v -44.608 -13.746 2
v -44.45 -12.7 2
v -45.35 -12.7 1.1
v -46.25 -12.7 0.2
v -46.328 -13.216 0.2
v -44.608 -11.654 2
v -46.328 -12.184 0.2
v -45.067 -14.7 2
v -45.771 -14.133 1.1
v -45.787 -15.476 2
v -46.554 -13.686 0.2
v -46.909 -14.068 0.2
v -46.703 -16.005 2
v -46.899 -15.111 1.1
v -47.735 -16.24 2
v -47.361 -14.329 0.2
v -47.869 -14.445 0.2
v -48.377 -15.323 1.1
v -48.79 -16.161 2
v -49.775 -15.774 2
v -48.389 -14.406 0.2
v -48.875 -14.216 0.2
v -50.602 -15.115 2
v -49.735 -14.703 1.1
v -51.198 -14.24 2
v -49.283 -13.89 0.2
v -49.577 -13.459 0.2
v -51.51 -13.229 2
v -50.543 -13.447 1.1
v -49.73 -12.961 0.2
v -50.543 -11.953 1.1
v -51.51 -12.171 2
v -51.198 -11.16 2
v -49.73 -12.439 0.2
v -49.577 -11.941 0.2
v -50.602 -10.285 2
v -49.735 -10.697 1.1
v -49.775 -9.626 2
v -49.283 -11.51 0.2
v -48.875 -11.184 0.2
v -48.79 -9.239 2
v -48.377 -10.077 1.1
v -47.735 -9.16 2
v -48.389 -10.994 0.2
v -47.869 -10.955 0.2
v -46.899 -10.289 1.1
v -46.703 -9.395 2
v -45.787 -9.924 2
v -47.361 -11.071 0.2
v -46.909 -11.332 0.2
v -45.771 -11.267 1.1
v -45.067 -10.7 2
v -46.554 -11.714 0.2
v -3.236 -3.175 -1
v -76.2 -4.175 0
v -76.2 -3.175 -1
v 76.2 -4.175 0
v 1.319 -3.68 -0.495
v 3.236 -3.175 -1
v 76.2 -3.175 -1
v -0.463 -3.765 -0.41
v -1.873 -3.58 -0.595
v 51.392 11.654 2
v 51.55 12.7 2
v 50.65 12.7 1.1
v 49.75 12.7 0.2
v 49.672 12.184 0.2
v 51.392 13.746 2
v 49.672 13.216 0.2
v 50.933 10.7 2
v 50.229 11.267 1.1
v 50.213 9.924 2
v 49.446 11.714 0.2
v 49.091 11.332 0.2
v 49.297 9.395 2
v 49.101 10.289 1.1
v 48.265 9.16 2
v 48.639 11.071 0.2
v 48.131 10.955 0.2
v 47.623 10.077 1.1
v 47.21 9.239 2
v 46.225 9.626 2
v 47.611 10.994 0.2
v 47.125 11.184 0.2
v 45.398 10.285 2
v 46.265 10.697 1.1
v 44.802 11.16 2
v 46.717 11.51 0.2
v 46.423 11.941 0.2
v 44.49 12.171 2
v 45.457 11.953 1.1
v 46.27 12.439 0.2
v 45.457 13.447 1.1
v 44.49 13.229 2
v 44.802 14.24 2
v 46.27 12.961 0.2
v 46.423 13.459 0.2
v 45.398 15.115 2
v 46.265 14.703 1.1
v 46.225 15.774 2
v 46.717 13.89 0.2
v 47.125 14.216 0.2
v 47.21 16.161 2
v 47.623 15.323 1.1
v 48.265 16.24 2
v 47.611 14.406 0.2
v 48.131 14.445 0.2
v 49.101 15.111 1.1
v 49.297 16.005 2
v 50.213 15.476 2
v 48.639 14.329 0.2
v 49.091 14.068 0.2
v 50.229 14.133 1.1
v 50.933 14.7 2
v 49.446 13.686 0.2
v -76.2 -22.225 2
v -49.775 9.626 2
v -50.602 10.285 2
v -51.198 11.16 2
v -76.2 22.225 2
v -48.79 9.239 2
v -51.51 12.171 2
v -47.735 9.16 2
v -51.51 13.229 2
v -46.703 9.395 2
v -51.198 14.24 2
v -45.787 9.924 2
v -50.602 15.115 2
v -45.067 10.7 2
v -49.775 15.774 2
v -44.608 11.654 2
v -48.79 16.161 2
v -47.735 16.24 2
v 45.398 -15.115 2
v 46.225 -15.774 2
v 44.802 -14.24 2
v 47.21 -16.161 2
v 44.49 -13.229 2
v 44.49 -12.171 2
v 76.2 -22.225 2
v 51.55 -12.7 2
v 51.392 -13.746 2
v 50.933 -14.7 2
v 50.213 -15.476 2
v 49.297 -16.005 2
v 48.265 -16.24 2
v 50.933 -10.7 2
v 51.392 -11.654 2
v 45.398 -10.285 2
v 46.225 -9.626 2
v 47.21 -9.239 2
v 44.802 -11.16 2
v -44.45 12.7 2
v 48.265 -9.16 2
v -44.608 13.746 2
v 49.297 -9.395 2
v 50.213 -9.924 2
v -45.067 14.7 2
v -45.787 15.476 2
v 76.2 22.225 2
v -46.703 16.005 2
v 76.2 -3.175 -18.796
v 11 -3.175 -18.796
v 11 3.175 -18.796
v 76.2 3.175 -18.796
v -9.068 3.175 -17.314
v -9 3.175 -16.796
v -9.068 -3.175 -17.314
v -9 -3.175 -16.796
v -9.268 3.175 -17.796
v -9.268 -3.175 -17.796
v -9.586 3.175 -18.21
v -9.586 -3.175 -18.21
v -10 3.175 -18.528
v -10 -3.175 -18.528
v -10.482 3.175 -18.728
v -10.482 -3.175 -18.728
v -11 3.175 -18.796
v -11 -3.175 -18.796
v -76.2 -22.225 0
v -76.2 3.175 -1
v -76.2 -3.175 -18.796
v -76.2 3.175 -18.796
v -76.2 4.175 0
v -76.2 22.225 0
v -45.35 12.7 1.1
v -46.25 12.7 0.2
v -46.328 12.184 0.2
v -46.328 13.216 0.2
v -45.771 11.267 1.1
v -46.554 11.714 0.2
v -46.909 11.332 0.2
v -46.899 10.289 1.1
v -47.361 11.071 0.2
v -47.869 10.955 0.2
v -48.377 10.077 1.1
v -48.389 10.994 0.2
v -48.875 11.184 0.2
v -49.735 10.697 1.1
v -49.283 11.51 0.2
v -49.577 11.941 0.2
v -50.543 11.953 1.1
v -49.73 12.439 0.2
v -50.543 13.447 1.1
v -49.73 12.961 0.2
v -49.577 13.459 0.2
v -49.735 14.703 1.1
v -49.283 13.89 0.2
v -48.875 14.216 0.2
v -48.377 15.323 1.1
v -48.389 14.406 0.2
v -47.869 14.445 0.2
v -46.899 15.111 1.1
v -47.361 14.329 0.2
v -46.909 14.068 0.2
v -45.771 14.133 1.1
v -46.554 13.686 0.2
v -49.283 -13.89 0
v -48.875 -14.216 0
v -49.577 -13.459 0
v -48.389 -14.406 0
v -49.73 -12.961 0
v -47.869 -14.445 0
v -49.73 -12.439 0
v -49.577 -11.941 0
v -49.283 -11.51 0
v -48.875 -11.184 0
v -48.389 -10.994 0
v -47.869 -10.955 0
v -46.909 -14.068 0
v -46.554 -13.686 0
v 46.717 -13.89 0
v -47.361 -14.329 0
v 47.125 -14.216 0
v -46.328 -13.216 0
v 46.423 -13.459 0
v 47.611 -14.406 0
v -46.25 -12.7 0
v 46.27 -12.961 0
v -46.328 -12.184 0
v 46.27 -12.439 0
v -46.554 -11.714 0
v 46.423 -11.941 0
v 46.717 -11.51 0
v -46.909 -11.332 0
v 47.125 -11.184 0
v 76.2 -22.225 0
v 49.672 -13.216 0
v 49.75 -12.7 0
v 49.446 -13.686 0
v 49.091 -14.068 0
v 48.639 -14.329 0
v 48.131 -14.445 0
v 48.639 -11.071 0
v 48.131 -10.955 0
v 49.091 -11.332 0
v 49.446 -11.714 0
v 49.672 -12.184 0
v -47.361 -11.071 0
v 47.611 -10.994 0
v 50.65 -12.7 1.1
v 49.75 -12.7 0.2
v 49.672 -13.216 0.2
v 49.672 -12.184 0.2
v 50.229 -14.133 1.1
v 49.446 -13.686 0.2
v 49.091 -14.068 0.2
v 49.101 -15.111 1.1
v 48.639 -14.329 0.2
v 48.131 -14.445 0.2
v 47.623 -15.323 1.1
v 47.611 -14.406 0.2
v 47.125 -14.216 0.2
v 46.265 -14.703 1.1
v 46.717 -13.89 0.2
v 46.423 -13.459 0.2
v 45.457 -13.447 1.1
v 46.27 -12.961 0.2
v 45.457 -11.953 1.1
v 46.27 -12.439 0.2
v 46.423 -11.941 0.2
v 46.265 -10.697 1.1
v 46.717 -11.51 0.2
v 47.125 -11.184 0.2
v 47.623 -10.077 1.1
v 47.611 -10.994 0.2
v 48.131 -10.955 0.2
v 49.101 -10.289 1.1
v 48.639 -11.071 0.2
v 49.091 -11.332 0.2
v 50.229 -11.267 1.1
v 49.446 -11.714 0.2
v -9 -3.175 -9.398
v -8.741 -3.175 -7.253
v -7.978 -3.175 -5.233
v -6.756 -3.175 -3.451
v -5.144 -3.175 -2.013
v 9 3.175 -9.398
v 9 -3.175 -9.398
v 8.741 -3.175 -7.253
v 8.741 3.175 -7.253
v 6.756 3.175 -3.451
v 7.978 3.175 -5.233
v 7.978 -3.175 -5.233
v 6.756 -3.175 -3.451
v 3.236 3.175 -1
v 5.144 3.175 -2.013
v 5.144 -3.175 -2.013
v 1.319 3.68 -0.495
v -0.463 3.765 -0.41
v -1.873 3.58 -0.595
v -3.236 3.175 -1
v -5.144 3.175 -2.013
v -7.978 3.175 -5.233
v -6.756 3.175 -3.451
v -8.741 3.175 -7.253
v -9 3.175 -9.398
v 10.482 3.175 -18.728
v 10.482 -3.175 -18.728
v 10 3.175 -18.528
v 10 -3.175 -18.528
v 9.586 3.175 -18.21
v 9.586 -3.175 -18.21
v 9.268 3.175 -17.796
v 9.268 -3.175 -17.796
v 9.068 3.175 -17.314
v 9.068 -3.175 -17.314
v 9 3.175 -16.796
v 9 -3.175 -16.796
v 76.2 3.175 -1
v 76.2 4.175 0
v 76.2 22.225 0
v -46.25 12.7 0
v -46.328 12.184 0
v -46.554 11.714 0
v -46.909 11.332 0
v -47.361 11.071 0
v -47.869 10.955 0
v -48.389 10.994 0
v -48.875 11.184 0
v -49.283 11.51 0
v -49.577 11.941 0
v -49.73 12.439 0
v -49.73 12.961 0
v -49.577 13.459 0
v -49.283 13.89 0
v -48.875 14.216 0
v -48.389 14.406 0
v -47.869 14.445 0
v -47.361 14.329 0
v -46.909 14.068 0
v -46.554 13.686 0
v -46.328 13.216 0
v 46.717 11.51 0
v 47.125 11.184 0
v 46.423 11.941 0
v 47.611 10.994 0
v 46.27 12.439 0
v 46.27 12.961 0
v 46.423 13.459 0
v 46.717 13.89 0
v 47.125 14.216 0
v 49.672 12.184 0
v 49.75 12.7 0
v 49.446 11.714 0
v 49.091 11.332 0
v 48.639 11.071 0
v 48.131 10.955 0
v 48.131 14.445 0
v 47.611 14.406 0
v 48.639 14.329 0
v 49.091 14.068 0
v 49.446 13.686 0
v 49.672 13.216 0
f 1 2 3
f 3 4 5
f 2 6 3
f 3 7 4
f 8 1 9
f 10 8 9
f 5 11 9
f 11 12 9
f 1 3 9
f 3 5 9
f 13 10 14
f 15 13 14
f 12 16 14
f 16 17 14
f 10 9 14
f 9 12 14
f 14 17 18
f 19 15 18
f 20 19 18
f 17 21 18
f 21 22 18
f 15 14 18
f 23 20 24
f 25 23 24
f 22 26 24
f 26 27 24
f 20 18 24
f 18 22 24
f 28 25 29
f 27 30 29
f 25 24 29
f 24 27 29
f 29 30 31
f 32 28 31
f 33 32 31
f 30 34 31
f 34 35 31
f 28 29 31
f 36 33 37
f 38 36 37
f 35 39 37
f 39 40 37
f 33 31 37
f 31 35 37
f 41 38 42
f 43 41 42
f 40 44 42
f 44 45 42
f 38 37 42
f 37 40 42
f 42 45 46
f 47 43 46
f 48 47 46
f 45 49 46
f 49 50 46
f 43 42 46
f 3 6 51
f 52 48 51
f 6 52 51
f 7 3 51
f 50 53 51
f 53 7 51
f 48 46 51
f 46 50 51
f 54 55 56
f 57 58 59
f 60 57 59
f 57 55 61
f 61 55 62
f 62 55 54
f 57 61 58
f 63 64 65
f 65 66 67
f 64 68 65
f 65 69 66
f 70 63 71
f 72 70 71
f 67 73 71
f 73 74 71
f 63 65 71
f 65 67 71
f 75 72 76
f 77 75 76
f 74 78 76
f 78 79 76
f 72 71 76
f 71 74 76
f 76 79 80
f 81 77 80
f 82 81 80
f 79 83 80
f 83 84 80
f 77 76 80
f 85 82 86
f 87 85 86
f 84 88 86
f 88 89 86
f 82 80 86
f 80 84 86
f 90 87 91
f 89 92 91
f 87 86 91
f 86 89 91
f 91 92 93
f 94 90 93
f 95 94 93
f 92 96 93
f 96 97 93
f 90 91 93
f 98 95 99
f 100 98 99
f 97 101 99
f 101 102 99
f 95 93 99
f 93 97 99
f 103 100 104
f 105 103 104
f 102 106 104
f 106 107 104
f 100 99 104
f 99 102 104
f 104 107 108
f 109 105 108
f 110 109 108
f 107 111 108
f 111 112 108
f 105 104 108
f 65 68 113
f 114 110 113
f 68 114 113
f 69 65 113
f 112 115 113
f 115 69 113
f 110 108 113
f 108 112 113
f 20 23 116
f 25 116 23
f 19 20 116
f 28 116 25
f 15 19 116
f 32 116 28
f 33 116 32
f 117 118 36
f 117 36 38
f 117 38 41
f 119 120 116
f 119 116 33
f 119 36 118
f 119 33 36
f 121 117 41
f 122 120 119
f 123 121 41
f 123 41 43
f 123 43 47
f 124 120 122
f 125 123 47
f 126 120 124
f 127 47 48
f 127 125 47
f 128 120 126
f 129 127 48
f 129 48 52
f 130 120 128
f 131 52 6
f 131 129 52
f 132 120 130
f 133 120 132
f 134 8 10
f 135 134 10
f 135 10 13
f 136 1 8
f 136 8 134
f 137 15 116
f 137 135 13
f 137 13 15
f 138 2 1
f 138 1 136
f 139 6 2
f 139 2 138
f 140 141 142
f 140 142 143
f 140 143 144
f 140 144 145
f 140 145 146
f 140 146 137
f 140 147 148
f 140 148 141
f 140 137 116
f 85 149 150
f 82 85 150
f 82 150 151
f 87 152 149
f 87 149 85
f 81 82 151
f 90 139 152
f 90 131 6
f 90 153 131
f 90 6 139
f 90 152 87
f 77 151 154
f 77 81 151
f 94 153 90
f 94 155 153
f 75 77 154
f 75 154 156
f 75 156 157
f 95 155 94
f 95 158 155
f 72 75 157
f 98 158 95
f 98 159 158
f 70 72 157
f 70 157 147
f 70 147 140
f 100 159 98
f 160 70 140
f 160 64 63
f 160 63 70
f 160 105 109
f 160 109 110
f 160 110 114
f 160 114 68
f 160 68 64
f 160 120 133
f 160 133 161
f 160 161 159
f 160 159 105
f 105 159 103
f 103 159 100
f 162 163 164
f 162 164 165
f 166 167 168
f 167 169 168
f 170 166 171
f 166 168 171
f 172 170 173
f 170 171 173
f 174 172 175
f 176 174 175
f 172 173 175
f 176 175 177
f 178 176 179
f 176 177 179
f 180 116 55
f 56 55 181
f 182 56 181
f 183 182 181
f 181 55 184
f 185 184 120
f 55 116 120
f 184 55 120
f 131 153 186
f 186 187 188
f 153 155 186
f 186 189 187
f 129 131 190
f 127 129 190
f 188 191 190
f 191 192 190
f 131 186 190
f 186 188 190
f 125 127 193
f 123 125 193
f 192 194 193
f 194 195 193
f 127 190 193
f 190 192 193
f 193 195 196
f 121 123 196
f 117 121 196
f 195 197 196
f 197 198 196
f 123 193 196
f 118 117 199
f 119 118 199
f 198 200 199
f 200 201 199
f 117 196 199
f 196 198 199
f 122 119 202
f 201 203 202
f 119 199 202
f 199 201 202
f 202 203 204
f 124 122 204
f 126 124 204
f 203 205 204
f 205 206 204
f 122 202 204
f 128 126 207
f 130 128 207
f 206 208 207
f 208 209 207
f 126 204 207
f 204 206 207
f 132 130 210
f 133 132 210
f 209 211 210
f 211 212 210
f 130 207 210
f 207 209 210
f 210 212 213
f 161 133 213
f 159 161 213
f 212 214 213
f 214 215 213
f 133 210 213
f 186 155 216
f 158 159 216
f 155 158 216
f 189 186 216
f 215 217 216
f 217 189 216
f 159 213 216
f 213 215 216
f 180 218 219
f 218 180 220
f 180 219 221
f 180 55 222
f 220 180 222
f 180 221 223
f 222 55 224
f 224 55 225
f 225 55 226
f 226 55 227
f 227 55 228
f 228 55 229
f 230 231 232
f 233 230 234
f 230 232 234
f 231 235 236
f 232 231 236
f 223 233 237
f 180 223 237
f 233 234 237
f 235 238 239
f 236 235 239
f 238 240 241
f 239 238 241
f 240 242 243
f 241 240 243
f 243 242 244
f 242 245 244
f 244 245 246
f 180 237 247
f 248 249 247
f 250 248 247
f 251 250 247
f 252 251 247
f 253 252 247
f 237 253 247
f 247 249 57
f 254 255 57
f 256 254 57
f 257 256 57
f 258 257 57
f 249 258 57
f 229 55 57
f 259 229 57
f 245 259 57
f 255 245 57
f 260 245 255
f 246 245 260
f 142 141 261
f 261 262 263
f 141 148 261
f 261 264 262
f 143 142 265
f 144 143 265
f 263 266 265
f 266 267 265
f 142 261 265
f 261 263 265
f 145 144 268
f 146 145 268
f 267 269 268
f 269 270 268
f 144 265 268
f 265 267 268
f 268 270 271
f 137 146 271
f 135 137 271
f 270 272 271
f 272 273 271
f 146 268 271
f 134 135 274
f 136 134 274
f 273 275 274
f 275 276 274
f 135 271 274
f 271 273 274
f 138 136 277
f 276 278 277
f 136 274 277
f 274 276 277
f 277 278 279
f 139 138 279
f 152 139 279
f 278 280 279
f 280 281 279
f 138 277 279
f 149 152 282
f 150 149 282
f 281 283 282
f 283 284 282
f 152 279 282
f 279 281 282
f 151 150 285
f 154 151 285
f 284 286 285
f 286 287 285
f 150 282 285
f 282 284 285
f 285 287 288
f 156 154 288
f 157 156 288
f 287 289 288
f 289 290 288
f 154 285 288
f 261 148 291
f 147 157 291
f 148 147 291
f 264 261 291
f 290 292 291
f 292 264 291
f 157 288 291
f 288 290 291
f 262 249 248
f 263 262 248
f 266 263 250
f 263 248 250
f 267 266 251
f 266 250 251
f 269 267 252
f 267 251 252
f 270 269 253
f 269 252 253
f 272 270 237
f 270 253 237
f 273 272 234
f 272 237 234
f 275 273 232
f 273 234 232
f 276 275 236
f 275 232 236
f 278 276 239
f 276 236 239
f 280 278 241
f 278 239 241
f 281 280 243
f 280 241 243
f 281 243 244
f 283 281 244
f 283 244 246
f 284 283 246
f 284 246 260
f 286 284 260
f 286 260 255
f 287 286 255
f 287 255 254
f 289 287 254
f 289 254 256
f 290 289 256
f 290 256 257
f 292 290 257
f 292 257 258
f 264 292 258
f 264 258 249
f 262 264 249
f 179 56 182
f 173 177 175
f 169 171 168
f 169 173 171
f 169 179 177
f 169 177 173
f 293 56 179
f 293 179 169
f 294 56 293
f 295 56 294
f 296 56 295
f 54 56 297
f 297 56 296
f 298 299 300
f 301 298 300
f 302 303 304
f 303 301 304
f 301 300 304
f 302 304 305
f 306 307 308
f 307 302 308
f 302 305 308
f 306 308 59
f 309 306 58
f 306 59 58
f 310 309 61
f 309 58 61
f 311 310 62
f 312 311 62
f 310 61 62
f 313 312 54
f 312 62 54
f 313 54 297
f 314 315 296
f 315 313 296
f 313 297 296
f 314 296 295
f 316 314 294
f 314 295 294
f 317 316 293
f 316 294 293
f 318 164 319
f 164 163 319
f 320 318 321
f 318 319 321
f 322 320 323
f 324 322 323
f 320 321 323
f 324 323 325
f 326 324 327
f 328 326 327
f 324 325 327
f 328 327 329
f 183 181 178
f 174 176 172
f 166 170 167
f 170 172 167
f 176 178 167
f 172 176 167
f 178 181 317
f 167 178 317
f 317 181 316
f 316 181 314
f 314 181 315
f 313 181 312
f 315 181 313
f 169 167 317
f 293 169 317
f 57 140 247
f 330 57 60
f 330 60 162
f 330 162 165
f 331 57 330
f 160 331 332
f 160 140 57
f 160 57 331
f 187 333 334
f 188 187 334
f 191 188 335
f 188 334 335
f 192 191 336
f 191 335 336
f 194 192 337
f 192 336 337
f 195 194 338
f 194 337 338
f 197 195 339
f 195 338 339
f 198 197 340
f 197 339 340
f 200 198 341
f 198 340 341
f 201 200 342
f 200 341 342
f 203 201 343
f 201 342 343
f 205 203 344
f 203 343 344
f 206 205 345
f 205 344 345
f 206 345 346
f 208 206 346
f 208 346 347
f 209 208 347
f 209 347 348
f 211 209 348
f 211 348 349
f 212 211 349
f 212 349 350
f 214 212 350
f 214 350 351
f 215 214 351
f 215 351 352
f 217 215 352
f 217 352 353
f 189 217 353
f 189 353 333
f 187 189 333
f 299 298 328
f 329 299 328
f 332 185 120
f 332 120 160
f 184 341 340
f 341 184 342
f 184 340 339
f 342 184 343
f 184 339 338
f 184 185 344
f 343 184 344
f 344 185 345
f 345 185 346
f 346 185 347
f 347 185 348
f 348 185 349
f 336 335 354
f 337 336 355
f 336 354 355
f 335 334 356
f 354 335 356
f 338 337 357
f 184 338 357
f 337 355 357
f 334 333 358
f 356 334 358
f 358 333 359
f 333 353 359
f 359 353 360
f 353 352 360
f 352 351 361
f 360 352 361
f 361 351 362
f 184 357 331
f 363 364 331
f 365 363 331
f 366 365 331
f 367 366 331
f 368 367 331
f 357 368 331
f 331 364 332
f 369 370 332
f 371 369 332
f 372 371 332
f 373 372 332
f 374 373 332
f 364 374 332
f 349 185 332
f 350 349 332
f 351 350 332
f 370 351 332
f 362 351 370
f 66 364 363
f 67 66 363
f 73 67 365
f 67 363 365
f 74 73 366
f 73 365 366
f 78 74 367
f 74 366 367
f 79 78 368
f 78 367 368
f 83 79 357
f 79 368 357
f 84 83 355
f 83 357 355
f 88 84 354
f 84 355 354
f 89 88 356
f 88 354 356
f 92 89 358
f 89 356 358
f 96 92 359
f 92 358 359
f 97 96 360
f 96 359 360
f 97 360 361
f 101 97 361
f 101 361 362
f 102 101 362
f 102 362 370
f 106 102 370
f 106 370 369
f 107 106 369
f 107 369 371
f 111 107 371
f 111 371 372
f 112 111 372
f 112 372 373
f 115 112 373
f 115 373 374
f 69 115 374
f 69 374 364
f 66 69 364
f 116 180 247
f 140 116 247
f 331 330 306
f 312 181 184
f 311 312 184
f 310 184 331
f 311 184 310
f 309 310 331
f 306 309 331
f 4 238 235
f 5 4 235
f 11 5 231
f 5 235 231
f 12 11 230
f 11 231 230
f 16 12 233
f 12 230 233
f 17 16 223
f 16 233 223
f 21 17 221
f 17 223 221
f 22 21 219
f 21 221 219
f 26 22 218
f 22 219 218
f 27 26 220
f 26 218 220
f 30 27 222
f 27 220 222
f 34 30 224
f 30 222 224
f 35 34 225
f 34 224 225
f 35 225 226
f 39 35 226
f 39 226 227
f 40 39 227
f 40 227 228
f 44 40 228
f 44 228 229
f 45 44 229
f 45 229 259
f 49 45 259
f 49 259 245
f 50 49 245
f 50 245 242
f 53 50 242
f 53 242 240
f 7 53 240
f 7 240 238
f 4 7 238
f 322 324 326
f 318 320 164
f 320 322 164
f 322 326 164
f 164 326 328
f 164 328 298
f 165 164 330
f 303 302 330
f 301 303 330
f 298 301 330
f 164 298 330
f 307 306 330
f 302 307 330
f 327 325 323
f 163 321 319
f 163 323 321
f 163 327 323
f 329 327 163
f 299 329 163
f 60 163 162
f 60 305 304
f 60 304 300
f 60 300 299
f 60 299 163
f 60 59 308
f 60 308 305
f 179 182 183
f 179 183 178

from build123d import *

# Parameters (mm, degrees)
F0_W         = 152.4
F0_H         = 44.45
F1_DEPTH     = 2
F2_W         = 152.4
F2_H         = 6.35
F3_DEPTH     = 18.796
F4_R         = 1.75
F5_DEPTH     = 25
F7_DEPTH     = 25.401
F8_SIZE      = 1.8
F9_T4_DEPTH  = 152.4
F9_S5_R      = 9
F9_T6_DEPTH  = 78
F9_T10_DEPTH = 152.4
F9_S11_R     = 9
F9_T12_DEPTH = 78
F10_R        = 2


# Not quite as in the source:
# - a fillet or chamfer that OpenCascade refuses, or shapes differently, is made with other operations: its cross-section is extruded or revolved along the edge and cut away or added
# - a feature names something its author has since deleted; it is built from what else it names


with BuildPart() as f1:
    # F0 (on Top) → F1 (new body)
    with BuildSketch(Plane.XY):
        Rectangle(F0_W, F0_H)
    extrude(amount=F1_DEPTH)

    # F2 (on face) → F3 (join)
    with BuildSketch(Plane(origin=(0, 0, 0), x_dir=(1, 0, 0), z_dir=(0, 0, -1))):
        Rectangle(F2_W, F2_H)
    extrude(amount=F3_DEPTH)

    # F4 (on face) → F5 (cut)
    with BuildSketch(Plane(origin=(0, 0, 0), x_dir=(1, 0, 0), z_dir=(0, 0, -1))):
        with Locations((48, -12.7)):
            Circle(F4_R)
        with Locations((-48, -12.7)):
            Circle(F4_R)
        with Locations((-48, 12.7)):
            Circle(F4_R)
        with Locations((48, 12.7)):
            Circle(F4_R)
    extrude(amount=-F5_DEPTH, mode=Mode.SUBTRACT)

    # F6 (on face) → F7 (cut, through all)
    with BuildSketch(Plane(origin=(0, 3.175, 0), x_dir=(-1, 0, 0), z_dir=(0, 1, 0))):
        with BuildLine():
            ThreePointArc((-9, -9.398), (0, -18.398), (9, -9.398))
            ThreePointArc((9, -9.398), (0, -0.398), (-9, -9.398))
        make_face()
        with BuildLine():
            Line((9, -18.796), (9, -9.398))
            ThreePointArc((9, -9.398), (0, -18.398), (-9, -9.398))
            Line((-9, -9.398), (-9, -18.796))
            Line((-9, -18.796), (9, -18.796))
        make_face()
    extrude(amount=-F7_DEPTH, mode=Mode.SUBTRACT)

    # F8
    f8_edges = [f1.edges().sort_by_distance(p)[0] for p in [
        (46.25, -12.7, 2),
        (-49.75, -12.7, 2),
        (-49.75, 12.7, 2),
        (46.25, 12.7, 2),
    ]]
    chamfer(f8_edges, length=F8_SIZE)

    # F9: chamfer of 1 on 2 edges, made by hand


with BuildPart() as f9_tool2:
    # F9_s3 → F9_t4 (new body)
    with BuildSketch(Plane.YZ.offset(-76.2)):
        Polygon((3.175, -1), (4.175, 0), (3.175, 0), align=None)
    extrude(amount=F9_T4_DEPTH)

    # F9_s5 → F9_t6 (cut, symmetric)
    with BuildSketch(Plane.XZ.offset(-3.7)):
        with Locations((0, -9.398)):
            Circle(F9_S5_R)
    extrude(amount=F9_T6_DEPTH, both=True, mode=Mode.SUBTRACT)


with BuildPart() as f1_1:
    add(f1.part)

    # F9_t1: union F9_tool2
    add(f9_tool2.part)


with BuildPart() as f9_tool8:
    # F9_s9 → F9_t10 (new body)
    with BuildSketch(Plane.YZ.offset(76.2)):
        Polygon((-4.175, 0), (-3.175, -1), (-3.175, 0), align=None)
    extrude(amount=-F9_T10_DEPTH)

    # F9_s11 → F9_t12 (cut, symmetric)
    with BuildSketch(Plane.XZ.offset(3.7)):
        with Locations((0, -9.398)):
            Circle(F9_S11_R)
    extrude(amount=F9_T12_DEPTH, both=True, mode=Mode.SUBTRACT)


with BuildPart() as f1_2:
    add(f1_1.part)

    # F9_t7: union F9_tool8
    add(f9_tool8.part)

    # F10
    f10_edges = [f1_2.edges().sort_by_distance(p)[0] for p in [
        (9, 0, -18.796),
        (-9, 0, -18.796),
    ]]
    fillet(f10_edges, radius=F10_R)


solid = f1_2.part
